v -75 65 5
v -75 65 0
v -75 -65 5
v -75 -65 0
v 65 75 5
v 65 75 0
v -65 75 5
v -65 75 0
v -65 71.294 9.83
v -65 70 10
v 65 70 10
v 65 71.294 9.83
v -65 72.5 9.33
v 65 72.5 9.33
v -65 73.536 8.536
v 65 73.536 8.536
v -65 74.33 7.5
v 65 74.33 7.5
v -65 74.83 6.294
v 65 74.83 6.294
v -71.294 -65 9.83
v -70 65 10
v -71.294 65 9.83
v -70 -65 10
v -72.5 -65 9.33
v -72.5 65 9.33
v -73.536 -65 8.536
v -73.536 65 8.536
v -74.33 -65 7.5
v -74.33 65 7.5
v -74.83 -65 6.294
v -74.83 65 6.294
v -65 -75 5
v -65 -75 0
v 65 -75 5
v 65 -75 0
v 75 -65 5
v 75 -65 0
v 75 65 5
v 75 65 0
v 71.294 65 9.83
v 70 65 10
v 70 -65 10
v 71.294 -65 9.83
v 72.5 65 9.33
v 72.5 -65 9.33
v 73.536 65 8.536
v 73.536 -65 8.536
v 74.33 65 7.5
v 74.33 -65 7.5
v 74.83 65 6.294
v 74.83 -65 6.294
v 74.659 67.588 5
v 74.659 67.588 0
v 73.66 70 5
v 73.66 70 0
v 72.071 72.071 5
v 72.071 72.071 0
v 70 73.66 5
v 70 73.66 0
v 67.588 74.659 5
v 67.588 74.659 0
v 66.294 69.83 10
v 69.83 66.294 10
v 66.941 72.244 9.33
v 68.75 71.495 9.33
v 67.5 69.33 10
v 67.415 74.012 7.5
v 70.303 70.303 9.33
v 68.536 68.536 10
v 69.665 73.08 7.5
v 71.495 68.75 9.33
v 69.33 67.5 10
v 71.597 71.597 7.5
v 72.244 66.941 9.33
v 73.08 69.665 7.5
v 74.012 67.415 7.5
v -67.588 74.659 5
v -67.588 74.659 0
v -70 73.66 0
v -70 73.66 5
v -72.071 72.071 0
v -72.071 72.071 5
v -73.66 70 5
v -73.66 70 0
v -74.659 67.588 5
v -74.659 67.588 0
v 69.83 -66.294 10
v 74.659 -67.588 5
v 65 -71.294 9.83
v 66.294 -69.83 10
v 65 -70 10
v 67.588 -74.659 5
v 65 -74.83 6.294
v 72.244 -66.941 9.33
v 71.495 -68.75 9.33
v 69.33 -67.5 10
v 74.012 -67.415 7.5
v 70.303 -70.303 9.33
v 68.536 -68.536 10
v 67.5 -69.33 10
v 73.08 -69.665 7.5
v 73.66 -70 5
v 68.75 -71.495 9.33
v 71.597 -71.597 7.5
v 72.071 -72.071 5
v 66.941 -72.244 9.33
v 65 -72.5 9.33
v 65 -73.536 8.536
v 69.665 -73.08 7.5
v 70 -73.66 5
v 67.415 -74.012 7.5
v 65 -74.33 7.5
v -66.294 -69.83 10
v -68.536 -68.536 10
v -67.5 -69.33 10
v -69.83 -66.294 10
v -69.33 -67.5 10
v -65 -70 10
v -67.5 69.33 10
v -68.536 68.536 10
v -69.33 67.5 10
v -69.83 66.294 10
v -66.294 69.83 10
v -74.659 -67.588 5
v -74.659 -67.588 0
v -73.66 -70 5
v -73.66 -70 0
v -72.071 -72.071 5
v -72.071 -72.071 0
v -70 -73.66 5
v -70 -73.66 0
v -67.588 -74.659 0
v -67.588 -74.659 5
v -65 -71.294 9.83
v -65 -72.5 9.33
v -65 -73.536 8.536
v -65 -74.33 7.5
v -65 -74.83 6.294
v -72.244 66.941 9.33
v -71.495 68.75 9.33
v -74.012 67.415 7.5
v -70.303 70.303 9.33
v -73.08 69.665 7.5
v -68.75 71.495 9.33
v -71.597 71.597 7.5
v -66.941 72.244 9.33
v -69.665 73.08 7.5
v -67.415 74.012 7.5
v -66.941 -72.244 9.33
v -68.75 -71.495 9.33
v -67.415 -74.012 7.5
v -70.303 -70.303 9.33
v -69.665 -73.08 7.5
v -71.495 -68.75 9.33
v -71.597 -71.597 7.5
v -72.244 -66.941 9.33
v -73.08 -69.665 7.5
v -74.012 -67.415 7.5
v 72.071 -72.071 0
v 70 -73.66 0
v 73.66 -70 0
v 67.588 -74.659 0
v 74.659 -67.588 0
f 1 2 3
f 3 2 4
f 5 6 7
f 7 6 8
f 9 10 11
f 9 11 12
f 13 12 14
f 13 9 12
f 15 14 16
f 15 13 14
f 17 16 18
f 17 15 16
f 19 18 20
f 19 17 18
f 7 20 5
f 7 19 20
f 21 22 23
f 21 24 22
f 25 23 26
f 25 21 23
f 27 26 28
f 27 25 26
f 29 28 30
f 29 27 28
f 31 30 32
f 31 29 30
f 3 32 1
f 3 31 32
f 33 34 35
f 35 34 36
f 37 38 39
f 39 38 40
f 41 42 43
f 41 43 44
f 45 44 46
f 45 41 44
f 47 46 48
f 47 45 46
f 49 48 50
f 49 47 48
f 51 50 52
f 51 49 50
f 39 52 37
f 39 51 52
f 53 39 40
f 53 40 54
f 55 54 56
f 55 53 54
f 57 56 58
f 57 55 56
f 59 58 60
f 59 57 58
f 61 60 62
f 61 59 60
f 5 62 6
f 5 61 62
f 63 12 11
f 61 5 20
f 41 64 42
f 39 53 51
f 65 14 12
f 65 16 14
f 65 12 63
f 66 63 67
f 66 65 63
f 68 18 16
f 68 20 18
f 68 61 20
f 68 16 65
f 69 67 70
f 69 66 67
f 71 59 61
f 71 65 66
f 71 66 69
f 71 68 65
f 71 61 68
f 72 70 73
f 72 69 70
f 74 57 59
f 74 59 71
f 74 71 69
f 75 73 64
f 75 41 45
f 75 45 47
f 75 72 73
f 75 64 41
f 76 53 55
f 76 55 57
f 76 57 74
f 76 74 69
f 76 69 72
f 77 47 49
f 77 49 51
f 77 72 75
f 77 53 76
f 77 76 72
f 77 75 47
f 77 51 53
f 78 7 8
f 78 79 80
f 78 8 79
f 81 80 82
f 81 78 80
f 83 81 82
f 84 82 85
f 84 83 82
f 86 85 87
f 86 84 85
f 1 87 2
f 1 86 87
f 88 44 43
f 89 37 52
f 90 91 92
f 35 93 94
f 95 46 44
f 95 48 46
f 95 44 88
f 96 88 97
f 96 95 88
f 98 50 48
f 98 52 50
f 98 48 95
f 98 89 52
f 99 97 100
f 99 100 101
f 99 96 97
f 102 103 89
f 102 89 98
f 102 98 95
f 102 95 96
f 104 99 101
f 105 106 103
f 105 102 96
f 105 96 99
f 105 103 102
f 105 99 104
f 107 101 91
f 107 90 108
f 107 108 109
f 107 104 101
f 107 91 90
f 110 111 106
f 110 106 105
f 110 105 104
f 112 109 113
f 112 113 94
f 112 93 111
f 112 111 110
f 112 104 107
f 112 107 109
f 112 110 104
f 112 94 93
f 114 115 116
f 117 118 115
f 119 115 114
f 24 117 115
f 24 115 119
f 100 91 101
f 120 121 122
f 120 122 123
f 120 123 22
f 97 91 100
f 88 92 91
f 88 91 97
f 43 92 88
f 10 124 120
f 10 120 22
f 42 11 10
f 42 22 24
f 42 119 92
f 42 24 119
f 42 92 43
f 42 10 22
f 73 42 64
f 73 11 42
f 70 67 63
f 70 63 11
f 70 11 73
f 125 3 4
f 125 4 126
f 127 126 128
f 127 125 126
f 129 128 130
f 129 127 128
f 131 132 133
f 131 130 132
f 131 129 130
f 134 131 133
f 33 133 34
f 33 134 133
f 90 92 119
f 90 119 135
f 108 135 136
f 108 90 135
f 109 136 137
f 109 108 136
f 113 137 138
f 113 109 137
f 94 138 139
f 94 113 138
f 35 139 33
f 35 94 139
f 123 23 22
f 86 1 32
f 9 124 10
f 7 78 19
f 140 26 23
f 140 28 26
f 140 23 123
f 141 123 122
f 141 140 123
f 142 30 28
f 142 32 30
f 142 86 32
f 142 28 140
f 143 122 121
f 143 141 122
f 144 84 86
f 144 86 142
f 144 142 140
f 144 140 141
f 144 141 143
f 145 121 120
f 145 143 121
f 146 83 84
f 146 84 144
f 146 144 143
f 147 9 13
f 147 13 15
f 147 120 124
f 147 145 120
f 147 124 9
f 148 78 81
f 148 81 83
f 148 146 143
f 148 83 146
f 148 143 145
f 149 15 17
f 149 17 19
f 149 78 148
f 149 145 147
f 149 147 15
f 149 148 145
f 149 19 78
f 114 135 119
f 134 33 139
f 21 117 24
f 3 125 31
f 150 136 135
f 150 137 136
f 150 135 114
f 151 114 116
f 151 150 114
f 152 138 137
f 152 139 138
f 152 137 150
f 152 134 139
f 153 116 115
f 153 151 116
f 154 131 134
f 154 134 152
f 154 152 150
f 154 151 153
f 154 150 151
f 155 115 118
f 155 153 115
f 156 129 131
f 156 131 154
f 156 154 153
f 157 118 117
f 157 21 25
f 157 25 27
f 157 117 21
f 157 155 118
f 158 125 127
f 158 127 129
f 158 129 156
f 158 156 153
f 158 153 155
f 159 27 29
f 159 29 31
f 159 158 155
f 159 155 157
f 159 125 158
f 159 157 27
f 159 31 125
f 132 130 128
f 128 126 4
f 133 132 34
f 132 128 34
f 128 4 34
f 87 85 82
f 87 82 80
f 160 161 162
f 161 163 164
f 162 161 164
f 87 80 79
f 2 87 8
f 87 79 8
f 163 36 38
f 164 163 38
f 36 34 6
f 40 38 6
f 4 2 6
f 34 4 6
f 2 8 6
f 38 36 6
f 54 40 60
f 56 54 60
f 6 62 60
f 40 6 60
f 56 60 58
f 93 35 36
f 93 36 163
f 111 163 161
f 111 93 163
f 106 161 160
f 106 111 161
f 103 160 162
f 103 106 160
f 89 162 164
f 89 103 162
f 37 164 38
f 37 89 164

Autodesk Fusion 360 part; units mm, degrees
sketch "Sketch2" plane through (0, -66.1791, -11.6692) normal (0, -0.9848, -0.1736) x (1, 0, 0)
  line L0 (-65, 123.5461) -> (-65, 22.0034)
  line L1 (-65, 22.0034) -> (65, 22.0034)
  line L2 (65, 22.0034) -> (65, 123.5461)
  line L3 (65, 123.5461) -> (55, 123.5461)
  line L4 (55, 123.5461) -> (-65, 123.5461)
  circle A0 centre (25, 62.0034) radius 0
  dimension "d1" = 0
  dimension "d2" = 40
  dimension "d3" = 40
sketch "Sketch1" plane through (0, 0, 0) normal (0, 0, 1) x (1, 0, 0)
  line L0 (75, 75) -> (-75, 75)
  line L1 (-75, 75) -> (-75, -75)
  line L2 (-75, -75) -> (75, -75)
  line L3 (75, -75) -> (75, 75)
  line L4 (75, 75) -> (-75, -75) construction
  line L5 (-75, 75) -> (75, -75) construction
  dimension "d17" = 150
  dimension "d18" = 150
extrude "Extrude1" add sketch "Sketch1" along normal blind 10
fillet "Fillet1" radius 10 4 edges at (-75, -75, 5) (75, -75, 5) (75, 75, 5) (-75, 75, 5)
fillet "Fillet1" radius 5 4 edges at (75, 0, 10) (0, 75, 10) (-75, 0, 10) (0, -75, 10)
extrude "Extrude2" [suppressed]
equation "d17 = standwidth"
equation "d18 = standwidth"
equation "d19 = standheight"
equation "standwidth = 150 mm"
equation "standheight = 10 mm"
equation "d1 = speakerhole_f"
